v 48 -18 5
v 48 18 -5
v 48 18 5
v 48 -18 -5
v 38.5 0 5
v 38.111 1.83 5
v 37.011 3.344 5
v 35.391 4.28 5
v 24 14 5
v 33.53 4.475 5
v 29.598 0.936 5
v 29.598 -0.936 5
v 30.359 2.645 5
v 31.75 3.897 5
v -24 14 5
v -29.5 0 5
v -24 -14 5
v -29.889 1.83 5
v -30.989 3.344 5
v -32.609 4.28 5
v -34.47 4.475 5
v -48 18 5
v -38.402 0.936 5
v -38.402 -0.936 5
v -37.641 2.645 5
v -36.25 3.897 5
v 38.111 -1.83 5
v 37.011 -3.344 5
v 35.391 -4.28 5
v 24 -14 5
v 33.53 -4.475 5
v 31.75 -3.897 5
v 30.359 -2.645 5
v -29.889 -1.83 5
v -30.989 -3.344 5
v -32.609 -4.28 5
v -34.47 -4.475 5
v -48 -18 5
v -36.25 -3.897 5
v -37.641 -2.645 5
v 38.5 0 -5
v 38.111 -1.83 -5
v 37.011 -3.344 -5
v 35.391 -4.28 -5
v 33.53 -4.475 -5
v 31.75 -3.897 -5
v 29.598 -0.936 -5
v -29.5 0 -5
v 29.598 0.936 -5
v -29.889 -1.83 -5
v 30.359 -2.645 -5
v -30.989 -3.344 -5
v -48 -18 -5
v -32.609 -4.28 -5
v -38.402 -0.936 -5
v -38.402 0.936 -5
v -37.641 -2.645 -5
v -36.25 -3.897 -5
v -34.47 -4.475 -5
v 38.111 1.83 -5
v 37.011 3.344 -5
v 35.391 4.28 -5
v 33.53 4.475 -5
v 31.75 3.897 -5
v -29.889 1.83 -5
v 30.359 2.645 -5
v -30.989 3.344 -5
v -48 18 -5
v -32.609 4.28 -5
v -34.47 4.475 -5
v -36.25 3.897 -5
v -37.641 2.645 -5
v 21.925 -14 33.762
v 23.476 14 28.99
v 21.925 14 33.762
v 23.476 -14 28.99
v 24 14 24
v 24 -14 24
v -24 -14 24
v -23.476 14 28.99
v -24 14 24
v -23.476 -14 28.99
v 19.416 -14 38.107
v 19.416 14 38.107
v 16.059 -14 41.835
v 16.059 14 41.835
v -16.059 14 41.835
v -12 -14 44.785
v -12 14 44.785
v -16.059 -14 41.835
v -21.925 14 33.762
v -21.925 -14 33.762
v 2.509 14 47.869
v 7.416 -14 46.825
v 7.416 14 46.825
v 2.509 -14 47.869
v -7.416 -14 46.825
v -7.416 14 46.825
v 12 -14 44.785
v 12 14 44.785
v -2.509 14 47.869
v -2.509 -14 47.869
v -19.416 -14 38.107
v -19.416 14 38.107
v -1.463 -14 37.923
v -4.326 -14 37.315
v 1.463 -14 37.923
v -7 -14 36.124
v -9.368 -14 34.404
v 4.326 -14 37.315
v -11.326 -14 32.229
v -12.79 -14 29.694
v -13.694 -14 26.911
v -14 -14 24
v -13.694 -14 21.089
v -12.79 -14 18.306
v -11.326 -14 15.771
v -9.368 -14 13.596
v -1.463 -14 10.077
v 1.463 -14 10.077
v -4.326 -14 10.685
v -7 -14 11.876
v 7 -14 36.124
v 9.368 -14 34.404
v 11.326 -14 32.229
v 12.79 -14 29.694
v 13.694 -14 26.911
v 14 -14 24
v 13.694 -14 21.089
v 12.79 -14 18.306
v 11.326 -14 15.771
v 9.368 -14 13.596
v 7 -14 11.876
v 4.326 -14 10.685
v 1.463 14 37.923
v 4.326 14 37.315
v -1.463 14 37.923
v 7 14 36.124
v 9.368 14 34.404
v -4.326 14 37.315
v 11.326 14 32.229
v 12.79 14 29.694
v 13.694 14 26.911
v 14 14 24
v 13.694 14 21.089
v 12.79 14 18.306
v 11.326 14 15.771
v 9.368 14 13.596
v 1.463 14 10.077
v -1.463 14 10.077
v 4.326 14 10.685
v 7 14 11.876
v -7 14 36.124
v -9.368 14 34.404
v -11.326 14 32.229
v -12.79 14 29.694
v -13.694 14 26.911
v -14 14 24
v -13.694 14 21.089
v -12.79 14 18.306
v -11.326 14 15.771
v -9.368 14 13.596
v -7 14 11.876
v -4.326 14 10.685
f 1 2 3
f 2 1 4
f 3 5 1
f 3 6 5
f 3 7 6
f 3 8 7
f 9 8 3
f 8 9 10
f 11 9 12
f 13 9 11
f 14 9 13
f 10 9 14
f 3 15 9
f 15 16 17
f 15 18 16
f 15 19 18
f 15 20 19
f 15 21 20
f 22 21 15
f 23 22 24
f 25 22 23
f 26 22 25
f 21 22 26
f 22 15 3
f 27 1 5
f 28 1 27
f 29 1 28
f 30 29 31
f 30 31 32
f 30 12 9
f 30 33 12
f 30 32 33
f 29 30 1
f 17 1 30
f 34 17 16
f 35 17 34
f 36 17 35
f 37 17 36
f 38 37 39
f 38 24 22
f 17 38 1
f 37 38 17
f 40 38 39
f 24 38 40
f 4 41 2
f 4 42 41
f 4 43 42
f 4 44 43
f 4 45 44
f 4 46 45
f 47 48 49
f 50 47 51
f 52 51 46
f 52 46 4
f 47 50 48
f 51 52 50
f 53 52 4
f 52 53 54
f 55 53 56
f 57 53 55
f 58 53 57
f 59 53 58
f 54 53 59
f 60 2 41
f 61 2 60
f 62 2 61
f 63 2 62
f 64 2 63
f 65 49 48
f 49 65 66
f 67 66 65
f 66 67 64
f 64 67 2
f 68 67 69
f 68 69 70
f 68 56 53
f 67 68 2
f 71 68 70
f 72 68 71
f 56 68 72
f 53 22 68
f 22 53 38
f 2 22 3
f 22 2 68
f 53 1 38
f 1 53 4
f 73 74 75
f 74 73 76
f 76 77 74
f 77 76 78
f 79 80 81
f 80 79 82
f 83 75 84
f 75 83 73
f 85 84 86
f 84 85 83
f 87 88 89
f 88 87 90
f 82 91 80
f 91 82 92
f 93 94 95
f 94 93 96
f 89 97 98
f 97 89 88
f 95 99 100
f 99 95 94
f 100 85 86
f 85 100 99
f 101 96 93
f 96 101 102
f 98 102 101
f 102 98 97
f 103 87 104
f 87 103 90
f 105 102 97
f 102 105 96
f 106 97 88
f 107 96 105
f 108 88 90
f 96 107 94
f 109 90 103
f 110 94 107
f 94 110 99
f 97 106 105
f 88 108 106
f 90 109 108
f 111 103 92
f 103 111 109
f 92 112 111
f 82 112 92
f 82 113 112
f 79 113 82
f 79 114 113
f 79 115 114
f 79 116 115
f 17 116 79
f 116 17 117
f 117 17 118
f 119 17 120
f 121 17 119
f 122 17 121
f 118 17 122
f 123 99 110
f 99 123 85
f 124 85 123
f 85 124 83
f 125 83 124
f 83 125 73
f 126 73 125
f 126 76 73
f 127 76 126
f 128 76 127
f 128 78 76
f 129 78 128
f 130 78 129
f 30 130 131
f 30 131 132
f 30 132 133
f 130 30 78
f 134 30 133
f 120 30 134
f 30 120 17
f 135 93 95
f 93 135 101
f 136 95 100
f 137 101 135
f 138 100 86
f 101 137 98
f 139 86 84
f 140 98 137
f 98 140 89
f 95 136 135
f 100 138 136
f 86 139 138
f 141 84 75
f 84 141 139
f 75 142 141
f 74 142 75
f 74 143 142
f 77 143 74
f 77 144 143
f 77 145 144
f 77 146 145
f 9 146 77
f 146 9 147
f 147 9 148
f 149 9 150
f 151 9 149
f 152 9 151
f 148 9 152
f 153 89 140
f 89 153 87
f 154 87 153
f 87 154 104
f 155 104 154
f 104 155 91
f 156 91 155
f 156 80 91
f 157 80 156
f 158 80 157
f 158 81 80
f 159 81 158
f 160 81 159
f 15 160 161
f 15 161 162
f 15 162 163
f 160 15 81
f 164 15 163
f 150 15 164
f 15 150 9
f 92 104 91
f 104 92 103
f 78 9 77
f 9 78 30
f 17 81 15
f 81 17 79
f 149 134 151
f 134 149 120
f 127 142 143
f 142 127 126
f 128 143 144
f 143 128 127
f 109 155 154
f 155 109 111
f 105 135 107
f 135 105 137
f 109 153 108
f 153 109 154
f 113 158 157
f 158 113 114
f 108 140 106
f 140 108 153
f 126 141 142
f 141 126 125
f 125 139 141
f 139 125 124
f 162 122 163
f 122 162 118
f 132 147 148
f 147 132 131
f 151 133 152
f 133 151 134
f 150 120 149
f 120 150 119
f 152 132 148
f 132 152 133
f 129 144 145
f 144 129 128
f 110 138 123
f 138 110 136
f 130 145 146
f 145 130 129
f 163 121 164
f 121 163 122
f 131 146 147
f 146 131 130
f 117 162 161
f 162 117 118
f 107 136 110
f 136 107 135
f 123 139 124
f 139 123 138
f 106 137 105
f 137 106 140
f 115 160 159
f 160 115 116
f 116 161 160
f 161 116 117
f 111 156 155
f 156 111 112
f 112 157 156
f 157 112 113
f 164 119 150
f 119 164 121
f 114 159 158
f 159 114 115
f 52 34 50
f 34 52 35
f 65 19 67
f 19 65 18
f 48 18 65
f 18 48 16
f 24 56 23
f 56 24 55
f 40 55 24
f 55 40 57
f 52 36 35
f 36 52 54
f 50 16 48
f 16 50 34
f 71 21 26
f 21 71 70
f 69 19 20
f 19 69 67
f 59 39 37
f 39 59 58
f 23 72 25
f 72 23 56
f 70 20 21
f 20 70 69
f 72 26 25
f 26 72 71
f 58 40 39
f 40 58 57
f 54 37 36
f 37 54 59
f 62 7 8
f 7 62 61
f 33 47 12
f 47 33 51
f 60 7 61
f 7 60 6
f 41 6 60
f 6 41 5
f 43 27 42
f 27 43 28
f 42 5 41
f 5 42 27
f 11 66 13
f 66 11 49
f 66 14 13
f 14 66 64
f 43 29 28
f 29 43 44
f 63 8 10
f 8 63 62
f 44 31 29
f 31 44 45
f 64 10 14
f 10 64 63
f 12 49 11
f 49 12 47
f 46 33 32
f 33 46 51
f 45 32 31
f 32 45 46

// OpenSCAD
// Pillow block bearing housing with mounting holes

base_x = 96;
base_y = 36;
base_z = 10;
body_r = 24;
body_w = 28;
bearing_r = 14;
shaft_r = 9;
mount_r = 4.5;
mount_x = 34;

module mount_hole(r = 4.5) {
    cylinder(h=30, r=r, center=true);
}

module shaft_hole(r = 9) {
    rotate([90, 0, 0]) {
        cylinder(h=80, r=r, center=true);
    }
}

module bearing_socket(r = 14) {
    rotate([90, 0, 0]) {
        cylinder(h=body_w + 4, r=r, center=true);
    }
}

difference() {
    union() {
        cube([base_x, base_y, base_z], center=true);
        translate([0, 0, body_r]) {
            rotate([90, 0, 0]) {
                cylinder(h=body_w, r=body_r, center=true);
            }
        }
        translate([0, 0, body_r / 2]) {
            cube([body_r * 2, body_w, body_r], center=true);
        }
    }
    translate([0, 0, body_r]) {
        bearing_socket(r=bearing_r);
    }
    translate([0, 0, body_r]) {
        shaft_hole(r=shaft_r);
    }
    translate([-mount_x, 0, 0]) {
        mount_hole(r=mount_r);
    }
    translate([mount_x, 0, 0]) {
        mount_hole(r=mount_r);
    }
}
